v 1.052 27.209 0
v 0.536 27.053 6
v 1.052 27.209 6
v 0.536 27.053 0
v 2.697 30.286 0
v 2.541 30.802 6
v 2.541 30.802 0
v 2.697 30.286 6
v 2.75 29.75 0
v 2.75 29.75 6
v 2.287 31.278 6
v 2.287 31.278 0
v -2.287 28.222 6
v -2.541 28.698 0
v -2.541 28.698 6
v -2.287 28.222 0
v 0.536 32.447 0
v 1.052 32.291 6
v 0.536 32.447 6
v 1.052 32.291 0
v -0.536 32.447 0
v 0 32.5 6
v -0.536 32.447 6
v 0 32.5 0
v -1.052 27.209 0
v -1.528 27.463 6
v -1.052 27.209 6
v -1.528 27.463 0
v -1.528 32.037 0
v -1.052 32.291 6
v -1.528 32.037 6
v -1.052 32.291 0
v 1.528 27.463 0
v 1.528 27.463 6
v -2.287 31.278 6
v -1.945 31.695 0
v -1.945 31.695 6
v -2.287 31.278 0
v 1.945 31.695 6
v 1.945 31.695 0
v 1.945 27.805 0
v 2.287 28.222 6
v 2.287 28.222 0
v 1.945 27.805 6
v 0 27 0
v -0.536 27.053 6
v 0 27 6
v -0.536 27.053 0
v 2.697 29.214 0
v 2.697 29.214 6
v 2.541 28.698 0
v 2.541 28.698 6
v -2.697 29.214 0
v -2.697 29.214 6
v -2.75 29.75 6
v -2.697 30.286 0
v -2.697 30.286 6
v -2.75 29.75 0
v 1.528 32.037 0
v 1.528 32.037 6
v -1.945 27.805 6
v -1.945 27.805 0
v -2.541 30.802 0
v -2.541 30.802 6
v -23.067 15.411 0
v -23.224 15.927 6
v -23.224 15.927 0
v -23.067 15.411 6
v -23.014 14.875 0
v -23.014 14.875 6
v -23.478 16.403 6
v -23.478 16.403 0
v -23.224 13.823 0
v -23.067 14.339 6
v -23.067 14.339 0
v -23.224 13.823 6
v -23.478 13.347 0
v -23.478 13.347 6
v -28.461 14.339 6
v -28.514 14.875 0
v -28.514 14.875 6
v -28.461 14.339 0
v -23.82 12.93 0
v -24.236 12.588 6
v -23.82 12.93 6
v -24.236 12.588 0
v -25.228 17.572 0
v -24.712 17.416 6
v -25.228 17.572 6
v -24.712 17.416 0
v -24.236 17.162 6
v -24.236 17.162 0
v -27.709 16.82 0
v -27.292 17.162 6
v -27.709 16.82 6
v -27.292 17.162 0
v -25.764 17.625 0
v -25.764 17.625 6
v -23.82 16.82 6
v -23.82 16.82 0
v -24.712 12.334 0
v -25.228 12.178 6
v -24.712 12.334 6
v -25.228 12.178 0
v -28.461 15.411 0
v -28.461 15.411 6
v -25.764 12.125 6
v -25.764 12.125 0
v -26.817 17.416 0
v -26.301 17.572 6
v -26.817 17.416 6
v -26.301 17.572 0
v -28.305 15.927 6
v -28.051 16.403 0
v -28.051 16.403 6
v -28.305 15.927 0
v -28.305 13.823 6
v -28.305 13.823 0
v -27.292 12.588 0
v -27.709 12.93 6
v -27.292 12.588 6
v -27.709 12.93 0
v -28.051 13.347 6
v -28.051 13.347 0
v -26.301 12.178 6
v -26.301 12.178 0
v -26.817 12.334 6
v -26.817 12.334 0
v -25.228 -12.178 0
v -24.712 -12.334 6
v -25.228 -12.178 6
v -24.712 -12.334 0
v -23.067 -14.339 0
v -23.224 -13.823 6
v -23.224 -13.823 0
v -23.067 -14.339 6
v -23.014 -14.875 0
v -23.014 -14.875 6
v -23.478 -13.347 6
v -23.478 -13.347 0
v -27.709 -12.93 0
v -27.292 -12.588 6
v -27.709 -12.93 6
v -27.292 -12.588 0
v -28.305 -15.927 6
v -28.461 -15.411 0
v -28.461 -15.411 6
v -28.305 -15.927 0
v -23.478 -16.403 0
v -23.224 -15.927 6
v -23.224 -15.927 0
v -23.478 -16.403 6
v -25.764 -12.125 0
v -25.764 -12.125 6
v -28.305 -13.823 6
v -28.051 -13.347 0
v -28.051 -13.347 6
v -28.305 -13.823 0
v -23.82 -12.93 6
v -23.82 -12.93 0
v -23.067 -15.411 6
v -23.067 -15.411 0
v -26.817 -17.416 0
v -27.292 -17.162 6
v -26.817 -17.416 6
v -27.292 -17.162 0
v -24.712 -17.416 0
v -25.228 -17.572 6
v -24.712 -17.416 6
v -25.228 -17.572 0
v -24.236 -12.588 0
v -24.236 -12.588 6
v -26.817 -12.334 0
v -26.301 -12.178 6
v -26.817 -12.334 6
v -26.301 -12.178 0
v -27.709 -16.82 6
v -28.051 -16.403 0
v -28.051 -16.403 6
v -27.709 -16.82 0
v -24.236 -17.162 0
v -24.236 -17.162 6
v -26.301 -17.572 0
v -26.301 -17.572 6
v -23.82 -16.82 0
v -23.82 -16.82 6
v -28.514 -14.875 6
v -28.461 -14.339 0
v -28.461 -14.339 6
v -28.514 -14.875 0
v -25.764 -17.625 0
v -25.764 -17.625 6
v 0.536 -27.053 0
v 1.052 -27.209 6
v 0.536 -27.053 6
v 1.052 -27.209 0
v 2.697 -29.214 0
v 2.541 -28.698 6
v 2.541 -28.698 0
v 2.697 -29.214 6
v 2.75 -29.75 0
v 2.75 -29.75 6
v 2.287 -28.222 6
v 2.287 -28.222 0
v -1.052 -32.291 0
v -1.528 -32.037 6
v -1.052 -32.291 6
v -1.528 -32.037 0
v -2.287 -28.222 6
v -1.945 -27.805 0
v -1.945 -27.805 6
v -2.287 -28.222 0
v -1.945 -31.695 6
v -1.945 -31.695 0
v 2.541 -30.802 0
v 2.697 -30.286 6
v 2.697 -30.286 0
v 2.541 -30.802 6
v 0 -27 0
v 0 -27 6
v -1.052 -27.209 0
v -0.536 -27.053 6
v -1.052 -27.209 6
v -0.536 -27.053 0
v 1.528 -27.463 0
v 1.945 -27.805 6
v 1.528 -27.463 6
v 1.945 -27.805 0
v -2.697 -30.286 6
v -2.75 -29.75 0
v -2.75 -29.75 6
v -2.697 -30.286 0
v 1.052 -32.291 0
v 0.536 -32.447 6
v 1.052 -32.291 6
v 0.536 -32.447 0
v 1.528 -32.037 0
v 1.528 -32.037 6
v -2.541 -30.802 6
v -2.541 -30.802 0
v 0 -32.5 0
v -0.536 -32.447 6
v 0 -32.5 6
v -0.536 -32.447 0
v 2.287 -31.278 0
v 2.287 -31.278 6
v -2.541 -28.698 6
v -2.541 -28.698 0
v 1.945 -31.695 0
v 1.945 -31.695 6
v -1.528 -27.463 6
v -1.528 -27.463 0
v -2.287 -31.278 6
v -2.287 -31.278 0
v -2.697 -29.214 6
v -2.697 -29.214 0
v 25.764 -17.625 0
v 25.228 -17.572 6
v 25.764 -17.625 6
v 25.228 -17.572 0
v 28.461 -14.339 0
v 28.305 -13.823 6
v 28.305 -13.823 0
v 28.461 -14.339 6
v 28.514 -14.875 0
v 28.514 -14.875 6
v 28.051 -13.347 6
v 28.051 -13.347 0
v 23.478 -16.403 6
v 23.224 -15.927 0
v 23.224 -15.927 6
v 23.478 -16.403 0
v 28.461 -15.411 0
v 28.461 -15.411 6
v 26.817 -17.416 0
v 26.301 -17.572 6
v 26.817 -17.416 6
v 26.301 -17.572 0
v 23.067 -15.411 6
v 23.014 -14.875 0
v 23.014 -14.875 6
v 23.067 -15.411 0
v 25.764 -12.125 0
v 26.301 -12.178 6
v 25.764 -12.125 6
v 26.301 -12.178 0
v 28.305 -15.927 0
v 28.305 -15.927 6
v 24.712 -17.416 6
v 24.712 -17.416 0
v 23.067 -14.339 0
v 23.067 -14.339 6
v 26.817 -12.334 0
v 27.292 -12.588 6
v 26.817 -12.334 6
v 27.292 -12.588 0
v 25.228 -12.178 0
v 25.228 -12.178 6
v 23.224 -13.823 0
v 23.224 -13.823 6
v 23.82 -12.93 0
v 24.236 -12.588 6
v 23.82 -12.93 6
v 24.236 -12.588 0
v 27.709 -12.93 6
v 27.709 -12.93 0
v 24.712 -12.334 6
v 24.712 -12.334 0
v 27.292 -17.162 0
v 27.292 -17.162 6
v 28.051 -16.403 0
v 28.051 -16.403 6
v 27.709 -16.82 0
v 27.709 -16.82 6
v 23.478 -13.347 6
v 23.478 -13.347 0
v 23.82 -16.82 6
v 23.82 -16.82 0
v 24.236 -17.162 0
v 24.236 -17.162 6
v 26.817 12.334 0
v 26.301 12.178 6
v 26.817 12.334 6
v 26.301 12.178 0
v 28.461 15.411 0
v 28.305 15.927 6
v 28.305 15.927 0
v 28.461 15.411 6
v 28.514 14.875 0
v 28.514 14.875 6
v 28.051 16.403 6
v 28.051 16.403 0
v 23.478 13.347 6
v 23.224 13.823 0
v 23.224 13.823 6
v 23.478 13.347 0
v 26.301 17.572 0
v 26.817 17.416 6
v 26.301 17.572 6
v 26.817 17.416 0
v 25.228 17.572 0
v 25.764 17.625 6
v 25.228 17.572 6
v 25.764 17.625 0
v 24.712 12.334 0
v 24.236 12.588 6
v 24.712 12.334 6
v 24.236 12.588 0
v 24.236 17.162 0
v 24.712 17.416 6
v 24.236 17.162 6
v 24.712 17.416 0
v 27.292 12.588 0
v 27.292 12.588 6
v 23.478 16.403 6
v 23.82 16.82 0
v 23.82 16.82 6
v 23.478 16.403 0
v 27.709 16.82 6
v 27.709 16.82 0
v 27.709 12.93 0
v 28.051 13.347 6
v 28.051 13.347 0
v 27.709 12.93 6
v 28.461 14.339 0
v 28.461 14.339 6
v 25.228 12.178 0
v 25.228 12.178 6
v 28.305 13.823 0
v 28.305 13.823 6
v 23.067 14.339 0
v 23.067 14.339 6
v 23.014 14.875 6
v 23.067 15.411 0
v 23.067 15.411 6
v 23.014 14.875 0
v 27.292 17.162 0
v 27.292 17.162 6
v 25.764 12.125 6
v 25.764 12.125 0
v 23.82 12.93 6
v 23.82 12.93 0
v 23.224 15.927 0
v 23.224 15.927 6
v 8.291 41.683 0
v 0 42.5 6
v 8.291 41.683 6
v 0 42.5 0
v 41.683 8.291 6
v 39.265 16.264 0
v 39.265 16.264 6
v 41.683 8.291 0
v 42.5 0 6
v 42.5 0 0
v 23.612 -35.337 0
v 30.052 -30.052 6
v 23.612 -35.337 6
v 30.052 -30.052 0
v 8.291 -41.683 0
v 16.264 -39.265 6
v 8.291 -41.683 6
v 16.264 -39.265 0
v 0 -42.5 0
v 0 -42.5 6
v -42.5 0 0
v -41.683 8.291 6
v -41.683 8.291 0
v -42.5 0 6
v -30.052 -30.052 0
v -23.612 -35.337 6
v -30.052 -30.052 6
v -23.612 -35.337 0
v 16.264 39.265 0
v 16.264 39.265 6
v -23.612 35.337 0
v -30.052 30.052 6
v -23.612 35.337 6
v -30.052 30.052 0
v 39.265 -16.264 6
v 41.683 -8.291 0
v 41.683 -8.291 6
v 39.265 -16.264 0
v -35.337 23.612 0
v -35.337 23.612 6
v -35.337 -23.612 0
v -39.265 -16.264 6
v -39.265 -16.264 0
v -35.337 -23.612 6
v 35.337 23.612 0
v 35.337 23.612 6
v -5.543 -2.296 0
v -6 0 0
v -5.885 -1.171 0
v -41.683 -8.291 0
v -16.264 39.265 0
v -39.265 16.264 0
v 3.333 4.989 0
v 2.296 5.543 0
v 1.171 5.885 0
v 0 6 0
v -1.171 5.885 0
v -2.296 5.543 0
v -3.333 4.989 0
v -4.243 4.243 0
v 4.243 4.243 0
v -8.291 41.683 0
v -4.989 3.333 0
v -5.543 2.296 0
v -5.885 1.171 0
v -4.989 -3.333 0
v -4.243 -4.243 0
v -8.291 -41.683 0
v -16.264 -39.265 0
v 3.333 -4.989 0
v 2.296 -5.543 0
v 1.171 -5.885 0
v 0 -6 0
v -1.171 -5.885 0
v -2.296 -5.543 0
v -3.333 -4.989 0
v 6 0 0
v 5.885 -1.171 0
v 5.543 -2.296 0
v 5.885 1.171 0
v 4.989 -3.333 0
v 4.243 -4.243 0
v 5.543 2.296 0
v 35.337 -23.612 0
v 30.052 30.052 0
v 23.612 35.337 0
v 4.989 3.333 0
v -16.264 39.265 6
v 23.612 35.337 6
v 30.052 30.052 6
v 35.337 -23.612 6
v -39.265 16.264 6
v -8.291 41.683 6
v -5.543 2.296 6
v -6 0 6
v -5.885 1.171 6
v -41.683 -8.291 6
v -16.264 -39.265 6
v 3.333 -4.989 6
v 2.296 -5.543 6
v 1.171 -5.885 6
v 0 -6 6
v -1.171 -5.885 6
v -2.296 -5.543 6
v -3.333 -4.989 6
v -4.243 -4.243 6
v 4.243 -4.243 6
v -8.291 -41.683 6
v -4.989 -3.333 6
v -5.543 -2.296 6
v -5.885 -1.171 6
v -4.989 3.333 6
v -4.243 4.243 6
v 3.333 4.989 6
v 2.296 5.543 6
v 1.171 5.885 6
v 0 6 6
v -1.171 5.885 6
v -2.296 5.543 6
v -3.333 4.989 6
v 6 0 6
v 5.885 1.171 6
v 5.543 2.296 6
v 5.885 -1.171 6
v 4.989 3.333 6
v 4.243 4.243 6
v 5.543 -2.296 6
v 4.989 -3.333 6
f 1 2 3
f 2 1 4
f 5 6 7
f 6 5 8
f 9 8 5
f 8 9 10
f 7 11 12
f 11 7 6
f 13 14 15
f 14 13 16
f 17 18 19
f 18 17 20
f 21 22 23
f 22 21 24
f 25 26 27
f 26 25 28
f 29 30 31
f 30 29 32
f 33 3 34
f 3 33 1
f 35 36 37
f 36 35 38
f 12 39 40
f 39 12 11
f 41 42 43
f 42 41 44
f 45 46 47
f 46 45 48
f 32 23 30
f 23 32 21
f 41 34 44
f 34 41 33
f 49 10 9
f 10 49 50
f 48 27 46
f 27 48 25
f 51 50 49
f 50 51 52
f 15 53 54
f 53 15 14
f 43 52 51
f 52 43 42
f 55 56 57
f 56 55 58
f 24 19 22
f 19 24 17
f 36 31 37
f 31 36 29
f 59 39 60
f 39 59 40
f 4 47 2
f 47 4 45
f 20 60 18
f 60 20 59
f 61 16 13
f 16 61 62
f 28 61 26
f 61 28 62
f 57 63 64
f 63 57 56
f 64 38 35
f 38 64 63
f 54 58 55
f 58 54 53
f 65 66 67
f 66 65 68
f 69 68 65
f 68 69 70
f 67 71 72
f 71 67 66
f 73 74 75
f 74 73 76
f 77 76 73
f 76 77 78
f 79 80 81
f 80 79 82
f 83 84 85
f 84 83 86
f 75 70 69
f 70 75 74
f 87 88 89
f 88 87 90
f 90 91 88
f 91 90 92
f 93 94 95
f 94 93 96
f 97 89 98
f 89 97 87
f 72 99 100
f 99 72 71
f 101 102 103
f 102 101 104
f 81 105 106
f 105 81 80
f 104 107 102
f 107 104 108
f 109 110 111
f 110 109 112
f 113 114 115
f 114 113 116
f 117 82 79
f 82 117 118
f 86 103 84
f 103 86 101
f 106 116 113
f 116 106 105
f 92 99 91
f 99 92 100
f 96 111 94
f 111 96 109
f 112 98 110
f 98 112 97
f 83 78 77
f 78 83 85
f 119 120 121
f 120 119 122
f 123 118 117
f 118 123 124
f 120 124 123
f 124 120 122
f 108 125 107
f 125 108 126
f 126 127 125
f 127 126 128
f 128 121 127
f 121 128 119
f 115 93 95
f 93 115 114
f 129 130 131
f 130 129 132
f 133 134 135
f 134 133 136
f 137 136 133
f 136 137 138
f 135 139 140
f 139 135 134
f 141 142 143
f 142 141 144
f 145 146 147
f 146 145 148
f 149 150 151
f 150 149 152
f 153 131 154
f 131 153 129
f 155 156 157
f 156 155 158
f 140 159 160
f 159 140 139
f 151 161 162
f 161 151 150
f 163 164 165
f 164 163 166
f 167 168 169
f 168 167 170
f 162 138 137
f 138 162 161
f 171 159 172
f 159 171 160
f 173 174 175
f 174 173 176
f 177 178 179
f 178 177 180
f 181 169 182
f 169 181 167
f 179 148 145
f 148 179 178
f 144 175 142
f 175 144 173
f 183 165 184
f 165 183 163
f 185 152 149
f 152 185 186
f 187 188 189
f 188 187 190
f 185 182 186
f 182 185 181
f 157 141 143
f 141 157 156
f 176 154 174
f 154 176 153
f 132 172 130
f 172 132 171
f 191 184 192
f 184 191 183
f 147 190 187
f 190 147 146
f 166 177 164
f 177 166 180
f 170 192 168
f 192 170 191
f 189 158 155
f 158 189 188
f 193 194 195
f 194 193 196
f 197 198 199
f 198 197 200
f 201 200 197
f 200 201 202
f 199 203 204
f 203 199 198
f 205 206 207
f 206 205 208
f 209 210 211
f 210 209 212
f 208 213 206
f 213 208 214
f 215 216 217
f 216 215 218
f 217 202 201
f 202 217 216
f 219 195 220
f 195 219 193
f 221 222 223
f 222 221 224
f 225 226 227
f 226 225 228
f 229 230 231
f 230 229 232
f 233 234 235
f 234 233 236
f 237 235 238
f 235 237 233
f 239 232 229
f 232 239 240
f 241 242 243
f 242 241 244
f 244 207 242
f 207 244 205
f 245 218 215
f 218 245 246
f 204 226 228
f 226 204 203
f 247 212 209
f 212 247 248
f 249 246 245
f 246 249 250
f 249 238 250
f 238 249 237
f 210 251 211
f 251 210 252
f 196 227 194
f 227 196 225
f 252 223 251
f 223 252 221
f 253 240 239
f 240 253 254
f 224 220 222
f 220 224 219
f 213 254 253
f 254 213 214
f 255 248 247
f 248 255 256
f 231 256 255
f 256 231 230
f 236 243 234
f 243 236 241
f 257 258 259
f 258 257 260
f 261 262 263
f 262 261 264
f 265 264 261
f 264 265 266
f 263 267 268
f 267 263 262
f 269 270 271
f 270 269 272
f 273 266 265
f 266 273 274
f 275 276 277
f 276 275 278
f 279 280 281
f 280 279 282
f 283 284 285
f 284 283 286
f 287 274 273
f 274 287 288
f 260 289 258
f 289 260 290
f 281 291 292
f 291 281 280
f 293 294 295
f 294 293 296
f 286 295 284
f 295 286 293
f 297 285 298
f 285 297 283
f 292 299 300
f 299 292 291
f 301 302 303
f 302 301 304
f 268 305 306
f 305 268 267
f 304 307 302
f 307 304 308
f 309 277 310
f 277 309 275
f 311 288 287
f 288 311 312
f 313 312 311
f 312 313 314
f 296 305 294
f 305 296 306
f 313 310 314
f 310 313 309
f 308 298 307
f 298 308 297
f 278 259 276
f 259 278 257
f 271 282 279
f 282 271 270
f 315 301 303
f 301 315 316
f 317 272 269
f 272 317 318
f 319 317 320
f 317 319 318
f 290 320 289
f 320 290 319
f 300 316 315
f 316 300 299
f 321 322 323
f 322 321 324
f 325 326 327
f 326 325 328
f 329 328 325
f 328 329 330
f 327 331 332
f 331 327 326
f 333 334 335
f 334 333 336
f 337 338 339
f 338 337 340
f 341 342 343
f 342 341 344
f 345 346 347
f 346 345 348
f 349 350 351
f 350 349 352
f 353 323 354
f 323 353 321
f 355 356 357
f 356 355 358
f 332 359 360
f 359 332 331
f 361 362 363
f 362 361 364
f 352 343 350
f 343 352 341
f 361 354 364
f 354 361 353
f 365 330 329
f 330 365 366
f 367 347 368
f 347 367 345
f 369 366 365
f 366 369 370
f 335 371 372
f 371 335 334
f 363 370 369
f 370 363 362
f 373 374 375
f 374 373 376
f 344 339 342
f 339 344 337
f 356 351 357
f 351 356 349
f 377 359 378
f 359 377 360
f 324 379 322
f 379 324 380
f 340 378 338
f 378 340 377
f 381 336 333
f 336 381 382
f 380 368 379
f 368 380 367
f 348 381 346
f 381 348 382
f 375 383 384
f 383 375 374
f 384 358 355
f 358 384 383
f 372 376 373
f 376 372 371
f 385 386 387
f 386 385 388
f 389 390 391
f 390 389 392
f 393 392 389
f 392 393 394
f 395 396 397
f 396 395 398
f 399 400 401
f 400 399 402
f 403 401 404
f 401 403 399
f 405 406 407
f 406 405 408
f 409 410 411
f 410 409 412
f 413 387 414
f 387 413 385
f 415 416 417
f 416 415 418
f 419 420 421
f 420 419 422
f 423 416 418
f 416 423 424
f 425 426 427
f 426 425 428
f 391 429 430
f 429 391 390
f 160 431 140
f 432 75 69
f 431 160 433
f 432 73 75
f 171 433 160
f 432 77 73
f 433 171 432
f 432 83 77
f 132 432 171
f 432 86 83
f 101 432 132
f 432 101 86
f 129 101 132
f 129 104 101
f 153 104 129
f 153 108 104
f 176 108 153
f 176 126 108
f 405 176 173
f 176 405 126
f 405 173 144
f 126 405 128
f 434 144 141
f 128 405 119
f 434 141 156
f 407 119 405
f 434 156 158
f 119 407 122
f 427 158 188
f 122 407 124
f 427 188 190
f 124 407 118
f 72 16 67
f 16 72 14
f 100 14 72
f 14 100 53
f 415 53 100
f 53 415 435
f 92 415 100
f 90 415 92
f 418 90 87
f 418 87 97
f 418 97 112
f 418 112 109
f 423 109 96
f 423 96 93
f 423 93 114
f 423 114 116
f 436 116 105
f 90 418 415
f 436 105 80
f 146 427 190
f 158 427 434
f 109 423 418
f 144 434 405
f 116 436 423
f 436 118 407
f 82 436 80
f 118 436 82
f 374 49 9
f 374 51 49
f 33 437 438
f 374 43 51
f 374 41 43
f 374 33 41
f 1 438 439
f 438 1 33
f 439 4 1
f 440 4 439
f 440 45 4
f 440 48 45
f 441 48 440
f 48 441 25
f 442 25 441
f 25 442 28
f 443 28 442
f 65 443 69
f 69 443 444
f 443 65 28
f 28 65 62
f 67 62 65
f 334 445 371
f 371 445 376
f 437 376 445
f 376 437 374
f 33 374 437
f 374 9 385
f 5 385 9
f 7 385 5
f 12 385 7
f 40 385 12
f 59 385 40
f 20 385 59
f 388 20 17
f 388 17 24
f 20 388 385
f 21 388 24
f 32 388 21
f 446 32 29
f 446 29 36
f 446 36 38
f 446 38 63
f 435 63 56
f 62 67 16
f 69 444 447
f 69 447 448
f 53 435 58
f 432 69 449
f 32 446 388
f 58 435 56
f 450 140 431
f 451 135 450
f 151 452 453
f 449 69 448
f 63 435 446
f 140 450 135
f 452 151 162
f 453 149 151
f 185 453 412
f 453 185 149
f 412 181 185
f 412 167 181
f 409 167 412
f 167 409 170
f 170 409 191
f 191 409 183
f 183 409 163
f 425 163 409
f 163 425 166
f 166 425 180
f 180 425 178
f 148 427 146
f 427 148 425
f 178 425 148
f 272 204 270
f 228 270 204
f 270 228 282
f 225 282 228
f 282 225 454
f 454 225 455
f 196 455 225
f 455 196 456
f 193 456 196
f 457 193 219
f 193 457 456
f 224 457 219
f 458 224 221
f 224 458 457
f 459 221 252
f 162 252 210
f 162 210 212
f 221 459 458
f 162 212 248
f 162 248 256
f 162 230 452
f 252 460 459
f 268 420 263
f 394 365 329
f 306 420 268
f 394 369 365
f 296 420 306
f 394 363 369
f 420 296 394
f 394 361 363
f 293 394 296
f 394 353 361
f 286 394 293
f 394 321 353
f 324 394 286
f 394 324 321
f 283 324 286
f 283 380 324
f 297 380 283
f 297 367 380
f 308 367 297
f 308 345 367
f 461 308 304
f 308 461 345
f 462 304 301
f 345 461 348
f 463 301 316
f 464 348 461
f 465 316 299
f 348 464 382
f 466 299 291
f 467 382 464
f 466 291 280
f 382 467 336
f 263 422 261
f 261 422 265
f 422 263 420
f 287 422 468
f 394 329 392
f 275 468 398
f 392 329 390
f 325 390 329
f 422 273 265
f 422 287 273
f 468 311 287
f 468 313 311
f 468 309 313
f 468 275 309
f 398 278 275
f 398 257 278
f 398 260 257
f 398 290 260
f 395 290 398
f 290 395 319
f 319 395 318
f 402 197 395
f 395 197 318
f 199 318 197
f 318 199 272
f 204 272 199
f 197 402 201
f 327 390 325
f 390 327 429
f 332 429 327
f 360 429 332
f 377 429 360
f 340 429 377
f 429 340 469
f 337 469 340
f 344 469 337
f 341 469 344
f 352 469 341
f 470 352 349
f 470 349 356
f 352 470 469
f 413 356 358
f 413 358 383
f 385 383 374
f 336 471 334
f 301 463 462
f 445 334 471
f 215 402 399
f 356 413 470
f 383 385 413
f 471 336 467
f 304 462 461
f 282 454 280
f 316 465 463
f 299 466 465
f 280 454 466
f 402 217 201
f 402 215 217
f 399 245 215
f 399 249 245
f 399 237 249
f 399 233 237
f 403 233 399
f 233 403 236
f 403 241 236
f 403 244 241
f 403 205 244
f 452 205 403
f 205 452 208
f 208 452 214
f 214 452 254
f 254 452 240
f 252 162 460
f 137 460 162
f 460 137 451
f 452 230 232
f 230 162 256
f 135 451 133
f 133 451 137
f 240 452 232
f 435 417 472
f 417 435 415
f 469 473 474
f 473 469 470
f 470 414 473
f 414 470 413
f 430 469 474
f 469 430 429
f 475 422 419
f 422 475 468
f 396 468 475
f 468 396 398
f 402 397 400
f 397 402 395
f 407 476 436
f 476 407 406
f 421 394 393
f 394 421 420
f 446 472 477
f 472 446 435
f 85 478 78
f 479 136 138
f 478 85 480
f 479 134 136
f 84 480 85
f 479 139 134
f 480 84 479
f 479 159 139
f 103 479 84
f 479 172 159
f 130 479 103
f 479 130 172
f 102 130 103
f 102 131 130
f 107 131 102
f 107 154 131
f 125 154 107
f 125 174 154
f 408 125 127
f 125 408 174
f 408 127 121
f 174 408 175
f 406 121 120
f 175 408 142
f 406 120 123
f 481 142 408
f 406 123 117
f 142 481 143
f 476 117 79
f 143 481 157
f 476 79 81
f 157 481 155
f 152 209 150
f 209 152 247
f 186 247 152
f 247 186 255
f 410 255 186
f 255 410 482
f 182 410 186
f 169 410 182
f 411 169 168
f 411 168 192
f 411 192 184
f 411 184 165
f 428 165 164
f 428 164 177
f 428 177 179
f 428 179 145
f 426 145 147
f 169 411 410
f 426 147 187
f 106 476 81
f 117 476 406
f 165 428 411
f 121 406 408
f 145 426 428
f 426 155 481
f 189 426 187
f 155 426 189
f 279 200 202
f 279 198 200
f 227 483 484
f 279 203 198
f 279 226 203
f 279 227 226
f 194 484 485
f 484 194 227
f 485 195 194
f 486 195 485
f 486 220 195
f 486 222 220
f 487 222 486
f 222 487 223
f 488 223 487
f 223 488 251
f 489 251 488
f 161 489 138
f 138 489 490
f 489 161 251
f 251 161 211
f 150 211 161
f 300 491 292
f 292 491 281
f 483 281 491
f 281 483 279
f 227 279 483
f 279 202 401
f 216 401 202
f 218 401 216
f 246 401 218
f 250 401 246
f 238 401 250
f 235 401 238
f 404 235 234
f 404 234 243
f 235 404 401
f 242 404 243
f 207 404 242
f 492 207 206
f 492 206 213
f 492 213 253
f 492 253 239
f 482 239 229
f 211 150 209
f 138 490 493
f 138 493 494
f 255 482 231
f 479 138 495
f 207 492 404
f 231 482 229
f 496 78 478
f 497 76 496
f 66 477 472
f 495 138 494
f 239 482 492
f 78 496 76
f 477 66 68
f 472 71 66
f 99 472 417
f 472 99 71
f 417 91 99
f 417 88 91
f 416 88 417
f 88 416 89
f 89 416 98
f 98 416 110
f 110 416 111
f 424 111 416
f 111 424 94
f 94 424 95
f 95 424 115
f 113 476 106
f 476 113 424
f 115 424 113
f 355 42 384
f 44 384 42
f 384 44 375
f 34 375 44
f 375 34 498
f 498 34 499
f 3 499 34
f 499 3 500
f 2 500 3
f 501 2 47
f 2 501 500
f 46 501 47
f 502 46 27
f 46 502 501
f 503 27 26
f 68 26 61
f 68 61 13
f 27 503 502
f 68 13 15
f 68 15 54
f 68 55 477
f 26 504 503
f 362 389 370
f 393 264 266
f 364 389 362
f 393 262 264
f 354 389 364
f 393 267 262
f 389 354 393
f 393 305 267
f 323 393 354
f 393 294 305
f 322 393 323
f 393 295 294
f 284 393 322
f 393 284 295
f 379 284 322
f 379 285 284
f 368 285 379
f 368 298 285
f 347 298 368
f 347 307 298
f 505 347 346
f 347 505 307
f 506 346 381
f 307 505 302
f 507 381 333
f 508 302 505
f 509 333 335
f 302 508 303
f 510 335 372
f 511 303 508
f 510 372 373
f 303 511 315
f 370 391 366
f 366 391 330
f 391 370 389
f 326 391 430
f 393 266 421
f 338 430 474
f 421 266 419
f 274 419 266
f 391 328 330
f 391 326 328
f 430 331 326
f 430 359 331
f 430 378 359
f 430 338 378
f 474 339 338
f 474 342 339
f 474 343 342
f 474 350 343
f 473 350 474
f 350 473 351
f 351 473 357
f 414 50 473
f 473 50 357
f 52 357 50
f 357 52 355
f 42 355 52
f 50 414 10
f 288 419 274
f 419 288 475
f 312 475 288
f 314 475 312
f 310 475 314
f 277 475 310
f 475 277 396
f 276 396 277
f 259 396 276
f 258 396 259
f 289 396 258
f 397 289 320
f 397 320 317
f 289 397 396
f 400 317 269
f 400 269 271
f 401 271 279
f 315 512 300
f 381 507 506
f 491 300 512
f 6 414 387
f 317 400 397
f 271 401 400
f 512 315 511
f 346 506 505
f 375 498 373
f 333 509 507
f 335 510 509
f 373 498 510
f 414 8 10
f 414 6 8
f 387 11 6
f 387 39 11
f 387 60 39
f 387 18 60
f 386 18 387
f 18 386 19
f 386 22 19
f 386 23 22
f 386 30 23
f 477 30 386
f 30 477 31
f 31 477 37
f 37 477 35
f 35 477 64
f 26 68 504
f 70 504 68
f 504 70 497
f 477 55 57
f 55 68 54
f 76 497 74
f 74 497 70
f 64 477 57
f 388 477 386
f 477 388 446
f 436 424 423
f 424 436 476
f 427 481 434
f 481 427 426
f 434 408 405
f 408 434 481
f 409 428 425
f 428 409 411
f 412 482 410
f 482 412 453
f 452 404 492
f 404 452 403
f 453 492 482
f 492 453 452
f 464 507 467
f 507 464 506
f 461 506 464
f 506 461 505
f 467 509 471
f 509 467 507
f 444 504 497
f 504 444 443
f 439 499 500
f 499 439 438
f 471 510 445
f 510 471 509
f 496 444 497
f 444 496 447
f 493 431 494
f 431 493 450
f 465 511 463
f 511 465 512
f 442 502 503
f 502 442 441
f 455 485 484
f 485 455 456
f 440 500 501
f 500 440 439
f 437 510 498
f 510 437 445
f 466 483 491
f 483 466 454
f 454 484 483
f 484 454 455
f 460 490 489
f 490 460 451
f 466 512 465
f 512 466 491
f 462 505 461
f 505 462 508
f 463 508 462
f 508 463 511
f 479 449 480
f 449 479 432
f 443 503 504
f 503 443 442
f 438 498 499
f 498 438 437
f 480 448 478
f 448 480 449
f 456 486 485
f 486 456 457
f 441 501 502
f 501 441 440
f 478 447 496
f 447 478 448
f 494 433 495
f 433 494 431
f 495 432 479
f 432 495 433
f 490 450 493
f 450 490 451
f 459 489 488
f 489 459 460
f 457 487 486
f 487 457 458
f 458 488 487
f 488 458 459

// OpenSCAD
$fn = 32;

// ----------------------------------------------------------------------
// Flange Ø85 x 6
// 6 holes on a Ø59.5 bolt circle, bolted joints
// ----------------------------------------------------------------------

// --- parameters (mm) ---
flange_d = 85;   // outside diameter of the flange
thickness = 6;   // flange thickness
holes = 6;       // number of bolt holes
pcd = 59.5;      // bolt circle diameter
start_deg = 90;  // angle of the first hole, from +X
hole_d = 5.5;    // bolt hole diameter
bore_d = 12;     // central through bore
hub_d = 24;      // hub outside diameter
hub_h = 0;       // hub height above the flange face (0 = no hub)

// --- derived feature positions (mm) ---
height = thickness + hub_h;  // = 6   overall height of the part
pcd_r = pcd / 2;             // = 29.75   bolt circle radius
hole_step = 360 / holes;     // = 60   angular pitch
feature_centers = [
  [pcd_r * cos(start_deg + 0 * hole_step), pcd_r * sin(start_deg + 0 * hole_step)],
  [pcd_r * cos(start_deg + 1 * hole_step), pcd_r * sin(start_deg + 1 * hole_step)],
  [pcd_r * cos(start_deg + 2 * hole_step), pcd_r * sin(start_deg + 2 * hole_step)],
  [pcd_r * cos(start_deg + 3 * hole_step), pcd_r * sin(start_deg + 3 * hole_step)],
  [pcd_r * cos(start_deg + 4 * hole_step), pcd_r * sin(start_deg + 4 * hole_step)],
  [pcd_r * cos(start_deg + 5 * hole_step), pcd_r * sin(start_deg + 5 * hole_step)]
];   // bolt hole centres on the pitch circle

// flange disc, every hole and the bore cut straight through
difference() {
  union() {
    cylinder(d = flange_d, h = thickness);
  }
  translate([0, 0, -1]) cylinder(d = bore_d, h = height + 2);  // bore, through
  for (centre = feature_centers)
    translate([centre[0], centre[1], -1]) cylinder(d = hole_d, h = thickness + 2);
}
